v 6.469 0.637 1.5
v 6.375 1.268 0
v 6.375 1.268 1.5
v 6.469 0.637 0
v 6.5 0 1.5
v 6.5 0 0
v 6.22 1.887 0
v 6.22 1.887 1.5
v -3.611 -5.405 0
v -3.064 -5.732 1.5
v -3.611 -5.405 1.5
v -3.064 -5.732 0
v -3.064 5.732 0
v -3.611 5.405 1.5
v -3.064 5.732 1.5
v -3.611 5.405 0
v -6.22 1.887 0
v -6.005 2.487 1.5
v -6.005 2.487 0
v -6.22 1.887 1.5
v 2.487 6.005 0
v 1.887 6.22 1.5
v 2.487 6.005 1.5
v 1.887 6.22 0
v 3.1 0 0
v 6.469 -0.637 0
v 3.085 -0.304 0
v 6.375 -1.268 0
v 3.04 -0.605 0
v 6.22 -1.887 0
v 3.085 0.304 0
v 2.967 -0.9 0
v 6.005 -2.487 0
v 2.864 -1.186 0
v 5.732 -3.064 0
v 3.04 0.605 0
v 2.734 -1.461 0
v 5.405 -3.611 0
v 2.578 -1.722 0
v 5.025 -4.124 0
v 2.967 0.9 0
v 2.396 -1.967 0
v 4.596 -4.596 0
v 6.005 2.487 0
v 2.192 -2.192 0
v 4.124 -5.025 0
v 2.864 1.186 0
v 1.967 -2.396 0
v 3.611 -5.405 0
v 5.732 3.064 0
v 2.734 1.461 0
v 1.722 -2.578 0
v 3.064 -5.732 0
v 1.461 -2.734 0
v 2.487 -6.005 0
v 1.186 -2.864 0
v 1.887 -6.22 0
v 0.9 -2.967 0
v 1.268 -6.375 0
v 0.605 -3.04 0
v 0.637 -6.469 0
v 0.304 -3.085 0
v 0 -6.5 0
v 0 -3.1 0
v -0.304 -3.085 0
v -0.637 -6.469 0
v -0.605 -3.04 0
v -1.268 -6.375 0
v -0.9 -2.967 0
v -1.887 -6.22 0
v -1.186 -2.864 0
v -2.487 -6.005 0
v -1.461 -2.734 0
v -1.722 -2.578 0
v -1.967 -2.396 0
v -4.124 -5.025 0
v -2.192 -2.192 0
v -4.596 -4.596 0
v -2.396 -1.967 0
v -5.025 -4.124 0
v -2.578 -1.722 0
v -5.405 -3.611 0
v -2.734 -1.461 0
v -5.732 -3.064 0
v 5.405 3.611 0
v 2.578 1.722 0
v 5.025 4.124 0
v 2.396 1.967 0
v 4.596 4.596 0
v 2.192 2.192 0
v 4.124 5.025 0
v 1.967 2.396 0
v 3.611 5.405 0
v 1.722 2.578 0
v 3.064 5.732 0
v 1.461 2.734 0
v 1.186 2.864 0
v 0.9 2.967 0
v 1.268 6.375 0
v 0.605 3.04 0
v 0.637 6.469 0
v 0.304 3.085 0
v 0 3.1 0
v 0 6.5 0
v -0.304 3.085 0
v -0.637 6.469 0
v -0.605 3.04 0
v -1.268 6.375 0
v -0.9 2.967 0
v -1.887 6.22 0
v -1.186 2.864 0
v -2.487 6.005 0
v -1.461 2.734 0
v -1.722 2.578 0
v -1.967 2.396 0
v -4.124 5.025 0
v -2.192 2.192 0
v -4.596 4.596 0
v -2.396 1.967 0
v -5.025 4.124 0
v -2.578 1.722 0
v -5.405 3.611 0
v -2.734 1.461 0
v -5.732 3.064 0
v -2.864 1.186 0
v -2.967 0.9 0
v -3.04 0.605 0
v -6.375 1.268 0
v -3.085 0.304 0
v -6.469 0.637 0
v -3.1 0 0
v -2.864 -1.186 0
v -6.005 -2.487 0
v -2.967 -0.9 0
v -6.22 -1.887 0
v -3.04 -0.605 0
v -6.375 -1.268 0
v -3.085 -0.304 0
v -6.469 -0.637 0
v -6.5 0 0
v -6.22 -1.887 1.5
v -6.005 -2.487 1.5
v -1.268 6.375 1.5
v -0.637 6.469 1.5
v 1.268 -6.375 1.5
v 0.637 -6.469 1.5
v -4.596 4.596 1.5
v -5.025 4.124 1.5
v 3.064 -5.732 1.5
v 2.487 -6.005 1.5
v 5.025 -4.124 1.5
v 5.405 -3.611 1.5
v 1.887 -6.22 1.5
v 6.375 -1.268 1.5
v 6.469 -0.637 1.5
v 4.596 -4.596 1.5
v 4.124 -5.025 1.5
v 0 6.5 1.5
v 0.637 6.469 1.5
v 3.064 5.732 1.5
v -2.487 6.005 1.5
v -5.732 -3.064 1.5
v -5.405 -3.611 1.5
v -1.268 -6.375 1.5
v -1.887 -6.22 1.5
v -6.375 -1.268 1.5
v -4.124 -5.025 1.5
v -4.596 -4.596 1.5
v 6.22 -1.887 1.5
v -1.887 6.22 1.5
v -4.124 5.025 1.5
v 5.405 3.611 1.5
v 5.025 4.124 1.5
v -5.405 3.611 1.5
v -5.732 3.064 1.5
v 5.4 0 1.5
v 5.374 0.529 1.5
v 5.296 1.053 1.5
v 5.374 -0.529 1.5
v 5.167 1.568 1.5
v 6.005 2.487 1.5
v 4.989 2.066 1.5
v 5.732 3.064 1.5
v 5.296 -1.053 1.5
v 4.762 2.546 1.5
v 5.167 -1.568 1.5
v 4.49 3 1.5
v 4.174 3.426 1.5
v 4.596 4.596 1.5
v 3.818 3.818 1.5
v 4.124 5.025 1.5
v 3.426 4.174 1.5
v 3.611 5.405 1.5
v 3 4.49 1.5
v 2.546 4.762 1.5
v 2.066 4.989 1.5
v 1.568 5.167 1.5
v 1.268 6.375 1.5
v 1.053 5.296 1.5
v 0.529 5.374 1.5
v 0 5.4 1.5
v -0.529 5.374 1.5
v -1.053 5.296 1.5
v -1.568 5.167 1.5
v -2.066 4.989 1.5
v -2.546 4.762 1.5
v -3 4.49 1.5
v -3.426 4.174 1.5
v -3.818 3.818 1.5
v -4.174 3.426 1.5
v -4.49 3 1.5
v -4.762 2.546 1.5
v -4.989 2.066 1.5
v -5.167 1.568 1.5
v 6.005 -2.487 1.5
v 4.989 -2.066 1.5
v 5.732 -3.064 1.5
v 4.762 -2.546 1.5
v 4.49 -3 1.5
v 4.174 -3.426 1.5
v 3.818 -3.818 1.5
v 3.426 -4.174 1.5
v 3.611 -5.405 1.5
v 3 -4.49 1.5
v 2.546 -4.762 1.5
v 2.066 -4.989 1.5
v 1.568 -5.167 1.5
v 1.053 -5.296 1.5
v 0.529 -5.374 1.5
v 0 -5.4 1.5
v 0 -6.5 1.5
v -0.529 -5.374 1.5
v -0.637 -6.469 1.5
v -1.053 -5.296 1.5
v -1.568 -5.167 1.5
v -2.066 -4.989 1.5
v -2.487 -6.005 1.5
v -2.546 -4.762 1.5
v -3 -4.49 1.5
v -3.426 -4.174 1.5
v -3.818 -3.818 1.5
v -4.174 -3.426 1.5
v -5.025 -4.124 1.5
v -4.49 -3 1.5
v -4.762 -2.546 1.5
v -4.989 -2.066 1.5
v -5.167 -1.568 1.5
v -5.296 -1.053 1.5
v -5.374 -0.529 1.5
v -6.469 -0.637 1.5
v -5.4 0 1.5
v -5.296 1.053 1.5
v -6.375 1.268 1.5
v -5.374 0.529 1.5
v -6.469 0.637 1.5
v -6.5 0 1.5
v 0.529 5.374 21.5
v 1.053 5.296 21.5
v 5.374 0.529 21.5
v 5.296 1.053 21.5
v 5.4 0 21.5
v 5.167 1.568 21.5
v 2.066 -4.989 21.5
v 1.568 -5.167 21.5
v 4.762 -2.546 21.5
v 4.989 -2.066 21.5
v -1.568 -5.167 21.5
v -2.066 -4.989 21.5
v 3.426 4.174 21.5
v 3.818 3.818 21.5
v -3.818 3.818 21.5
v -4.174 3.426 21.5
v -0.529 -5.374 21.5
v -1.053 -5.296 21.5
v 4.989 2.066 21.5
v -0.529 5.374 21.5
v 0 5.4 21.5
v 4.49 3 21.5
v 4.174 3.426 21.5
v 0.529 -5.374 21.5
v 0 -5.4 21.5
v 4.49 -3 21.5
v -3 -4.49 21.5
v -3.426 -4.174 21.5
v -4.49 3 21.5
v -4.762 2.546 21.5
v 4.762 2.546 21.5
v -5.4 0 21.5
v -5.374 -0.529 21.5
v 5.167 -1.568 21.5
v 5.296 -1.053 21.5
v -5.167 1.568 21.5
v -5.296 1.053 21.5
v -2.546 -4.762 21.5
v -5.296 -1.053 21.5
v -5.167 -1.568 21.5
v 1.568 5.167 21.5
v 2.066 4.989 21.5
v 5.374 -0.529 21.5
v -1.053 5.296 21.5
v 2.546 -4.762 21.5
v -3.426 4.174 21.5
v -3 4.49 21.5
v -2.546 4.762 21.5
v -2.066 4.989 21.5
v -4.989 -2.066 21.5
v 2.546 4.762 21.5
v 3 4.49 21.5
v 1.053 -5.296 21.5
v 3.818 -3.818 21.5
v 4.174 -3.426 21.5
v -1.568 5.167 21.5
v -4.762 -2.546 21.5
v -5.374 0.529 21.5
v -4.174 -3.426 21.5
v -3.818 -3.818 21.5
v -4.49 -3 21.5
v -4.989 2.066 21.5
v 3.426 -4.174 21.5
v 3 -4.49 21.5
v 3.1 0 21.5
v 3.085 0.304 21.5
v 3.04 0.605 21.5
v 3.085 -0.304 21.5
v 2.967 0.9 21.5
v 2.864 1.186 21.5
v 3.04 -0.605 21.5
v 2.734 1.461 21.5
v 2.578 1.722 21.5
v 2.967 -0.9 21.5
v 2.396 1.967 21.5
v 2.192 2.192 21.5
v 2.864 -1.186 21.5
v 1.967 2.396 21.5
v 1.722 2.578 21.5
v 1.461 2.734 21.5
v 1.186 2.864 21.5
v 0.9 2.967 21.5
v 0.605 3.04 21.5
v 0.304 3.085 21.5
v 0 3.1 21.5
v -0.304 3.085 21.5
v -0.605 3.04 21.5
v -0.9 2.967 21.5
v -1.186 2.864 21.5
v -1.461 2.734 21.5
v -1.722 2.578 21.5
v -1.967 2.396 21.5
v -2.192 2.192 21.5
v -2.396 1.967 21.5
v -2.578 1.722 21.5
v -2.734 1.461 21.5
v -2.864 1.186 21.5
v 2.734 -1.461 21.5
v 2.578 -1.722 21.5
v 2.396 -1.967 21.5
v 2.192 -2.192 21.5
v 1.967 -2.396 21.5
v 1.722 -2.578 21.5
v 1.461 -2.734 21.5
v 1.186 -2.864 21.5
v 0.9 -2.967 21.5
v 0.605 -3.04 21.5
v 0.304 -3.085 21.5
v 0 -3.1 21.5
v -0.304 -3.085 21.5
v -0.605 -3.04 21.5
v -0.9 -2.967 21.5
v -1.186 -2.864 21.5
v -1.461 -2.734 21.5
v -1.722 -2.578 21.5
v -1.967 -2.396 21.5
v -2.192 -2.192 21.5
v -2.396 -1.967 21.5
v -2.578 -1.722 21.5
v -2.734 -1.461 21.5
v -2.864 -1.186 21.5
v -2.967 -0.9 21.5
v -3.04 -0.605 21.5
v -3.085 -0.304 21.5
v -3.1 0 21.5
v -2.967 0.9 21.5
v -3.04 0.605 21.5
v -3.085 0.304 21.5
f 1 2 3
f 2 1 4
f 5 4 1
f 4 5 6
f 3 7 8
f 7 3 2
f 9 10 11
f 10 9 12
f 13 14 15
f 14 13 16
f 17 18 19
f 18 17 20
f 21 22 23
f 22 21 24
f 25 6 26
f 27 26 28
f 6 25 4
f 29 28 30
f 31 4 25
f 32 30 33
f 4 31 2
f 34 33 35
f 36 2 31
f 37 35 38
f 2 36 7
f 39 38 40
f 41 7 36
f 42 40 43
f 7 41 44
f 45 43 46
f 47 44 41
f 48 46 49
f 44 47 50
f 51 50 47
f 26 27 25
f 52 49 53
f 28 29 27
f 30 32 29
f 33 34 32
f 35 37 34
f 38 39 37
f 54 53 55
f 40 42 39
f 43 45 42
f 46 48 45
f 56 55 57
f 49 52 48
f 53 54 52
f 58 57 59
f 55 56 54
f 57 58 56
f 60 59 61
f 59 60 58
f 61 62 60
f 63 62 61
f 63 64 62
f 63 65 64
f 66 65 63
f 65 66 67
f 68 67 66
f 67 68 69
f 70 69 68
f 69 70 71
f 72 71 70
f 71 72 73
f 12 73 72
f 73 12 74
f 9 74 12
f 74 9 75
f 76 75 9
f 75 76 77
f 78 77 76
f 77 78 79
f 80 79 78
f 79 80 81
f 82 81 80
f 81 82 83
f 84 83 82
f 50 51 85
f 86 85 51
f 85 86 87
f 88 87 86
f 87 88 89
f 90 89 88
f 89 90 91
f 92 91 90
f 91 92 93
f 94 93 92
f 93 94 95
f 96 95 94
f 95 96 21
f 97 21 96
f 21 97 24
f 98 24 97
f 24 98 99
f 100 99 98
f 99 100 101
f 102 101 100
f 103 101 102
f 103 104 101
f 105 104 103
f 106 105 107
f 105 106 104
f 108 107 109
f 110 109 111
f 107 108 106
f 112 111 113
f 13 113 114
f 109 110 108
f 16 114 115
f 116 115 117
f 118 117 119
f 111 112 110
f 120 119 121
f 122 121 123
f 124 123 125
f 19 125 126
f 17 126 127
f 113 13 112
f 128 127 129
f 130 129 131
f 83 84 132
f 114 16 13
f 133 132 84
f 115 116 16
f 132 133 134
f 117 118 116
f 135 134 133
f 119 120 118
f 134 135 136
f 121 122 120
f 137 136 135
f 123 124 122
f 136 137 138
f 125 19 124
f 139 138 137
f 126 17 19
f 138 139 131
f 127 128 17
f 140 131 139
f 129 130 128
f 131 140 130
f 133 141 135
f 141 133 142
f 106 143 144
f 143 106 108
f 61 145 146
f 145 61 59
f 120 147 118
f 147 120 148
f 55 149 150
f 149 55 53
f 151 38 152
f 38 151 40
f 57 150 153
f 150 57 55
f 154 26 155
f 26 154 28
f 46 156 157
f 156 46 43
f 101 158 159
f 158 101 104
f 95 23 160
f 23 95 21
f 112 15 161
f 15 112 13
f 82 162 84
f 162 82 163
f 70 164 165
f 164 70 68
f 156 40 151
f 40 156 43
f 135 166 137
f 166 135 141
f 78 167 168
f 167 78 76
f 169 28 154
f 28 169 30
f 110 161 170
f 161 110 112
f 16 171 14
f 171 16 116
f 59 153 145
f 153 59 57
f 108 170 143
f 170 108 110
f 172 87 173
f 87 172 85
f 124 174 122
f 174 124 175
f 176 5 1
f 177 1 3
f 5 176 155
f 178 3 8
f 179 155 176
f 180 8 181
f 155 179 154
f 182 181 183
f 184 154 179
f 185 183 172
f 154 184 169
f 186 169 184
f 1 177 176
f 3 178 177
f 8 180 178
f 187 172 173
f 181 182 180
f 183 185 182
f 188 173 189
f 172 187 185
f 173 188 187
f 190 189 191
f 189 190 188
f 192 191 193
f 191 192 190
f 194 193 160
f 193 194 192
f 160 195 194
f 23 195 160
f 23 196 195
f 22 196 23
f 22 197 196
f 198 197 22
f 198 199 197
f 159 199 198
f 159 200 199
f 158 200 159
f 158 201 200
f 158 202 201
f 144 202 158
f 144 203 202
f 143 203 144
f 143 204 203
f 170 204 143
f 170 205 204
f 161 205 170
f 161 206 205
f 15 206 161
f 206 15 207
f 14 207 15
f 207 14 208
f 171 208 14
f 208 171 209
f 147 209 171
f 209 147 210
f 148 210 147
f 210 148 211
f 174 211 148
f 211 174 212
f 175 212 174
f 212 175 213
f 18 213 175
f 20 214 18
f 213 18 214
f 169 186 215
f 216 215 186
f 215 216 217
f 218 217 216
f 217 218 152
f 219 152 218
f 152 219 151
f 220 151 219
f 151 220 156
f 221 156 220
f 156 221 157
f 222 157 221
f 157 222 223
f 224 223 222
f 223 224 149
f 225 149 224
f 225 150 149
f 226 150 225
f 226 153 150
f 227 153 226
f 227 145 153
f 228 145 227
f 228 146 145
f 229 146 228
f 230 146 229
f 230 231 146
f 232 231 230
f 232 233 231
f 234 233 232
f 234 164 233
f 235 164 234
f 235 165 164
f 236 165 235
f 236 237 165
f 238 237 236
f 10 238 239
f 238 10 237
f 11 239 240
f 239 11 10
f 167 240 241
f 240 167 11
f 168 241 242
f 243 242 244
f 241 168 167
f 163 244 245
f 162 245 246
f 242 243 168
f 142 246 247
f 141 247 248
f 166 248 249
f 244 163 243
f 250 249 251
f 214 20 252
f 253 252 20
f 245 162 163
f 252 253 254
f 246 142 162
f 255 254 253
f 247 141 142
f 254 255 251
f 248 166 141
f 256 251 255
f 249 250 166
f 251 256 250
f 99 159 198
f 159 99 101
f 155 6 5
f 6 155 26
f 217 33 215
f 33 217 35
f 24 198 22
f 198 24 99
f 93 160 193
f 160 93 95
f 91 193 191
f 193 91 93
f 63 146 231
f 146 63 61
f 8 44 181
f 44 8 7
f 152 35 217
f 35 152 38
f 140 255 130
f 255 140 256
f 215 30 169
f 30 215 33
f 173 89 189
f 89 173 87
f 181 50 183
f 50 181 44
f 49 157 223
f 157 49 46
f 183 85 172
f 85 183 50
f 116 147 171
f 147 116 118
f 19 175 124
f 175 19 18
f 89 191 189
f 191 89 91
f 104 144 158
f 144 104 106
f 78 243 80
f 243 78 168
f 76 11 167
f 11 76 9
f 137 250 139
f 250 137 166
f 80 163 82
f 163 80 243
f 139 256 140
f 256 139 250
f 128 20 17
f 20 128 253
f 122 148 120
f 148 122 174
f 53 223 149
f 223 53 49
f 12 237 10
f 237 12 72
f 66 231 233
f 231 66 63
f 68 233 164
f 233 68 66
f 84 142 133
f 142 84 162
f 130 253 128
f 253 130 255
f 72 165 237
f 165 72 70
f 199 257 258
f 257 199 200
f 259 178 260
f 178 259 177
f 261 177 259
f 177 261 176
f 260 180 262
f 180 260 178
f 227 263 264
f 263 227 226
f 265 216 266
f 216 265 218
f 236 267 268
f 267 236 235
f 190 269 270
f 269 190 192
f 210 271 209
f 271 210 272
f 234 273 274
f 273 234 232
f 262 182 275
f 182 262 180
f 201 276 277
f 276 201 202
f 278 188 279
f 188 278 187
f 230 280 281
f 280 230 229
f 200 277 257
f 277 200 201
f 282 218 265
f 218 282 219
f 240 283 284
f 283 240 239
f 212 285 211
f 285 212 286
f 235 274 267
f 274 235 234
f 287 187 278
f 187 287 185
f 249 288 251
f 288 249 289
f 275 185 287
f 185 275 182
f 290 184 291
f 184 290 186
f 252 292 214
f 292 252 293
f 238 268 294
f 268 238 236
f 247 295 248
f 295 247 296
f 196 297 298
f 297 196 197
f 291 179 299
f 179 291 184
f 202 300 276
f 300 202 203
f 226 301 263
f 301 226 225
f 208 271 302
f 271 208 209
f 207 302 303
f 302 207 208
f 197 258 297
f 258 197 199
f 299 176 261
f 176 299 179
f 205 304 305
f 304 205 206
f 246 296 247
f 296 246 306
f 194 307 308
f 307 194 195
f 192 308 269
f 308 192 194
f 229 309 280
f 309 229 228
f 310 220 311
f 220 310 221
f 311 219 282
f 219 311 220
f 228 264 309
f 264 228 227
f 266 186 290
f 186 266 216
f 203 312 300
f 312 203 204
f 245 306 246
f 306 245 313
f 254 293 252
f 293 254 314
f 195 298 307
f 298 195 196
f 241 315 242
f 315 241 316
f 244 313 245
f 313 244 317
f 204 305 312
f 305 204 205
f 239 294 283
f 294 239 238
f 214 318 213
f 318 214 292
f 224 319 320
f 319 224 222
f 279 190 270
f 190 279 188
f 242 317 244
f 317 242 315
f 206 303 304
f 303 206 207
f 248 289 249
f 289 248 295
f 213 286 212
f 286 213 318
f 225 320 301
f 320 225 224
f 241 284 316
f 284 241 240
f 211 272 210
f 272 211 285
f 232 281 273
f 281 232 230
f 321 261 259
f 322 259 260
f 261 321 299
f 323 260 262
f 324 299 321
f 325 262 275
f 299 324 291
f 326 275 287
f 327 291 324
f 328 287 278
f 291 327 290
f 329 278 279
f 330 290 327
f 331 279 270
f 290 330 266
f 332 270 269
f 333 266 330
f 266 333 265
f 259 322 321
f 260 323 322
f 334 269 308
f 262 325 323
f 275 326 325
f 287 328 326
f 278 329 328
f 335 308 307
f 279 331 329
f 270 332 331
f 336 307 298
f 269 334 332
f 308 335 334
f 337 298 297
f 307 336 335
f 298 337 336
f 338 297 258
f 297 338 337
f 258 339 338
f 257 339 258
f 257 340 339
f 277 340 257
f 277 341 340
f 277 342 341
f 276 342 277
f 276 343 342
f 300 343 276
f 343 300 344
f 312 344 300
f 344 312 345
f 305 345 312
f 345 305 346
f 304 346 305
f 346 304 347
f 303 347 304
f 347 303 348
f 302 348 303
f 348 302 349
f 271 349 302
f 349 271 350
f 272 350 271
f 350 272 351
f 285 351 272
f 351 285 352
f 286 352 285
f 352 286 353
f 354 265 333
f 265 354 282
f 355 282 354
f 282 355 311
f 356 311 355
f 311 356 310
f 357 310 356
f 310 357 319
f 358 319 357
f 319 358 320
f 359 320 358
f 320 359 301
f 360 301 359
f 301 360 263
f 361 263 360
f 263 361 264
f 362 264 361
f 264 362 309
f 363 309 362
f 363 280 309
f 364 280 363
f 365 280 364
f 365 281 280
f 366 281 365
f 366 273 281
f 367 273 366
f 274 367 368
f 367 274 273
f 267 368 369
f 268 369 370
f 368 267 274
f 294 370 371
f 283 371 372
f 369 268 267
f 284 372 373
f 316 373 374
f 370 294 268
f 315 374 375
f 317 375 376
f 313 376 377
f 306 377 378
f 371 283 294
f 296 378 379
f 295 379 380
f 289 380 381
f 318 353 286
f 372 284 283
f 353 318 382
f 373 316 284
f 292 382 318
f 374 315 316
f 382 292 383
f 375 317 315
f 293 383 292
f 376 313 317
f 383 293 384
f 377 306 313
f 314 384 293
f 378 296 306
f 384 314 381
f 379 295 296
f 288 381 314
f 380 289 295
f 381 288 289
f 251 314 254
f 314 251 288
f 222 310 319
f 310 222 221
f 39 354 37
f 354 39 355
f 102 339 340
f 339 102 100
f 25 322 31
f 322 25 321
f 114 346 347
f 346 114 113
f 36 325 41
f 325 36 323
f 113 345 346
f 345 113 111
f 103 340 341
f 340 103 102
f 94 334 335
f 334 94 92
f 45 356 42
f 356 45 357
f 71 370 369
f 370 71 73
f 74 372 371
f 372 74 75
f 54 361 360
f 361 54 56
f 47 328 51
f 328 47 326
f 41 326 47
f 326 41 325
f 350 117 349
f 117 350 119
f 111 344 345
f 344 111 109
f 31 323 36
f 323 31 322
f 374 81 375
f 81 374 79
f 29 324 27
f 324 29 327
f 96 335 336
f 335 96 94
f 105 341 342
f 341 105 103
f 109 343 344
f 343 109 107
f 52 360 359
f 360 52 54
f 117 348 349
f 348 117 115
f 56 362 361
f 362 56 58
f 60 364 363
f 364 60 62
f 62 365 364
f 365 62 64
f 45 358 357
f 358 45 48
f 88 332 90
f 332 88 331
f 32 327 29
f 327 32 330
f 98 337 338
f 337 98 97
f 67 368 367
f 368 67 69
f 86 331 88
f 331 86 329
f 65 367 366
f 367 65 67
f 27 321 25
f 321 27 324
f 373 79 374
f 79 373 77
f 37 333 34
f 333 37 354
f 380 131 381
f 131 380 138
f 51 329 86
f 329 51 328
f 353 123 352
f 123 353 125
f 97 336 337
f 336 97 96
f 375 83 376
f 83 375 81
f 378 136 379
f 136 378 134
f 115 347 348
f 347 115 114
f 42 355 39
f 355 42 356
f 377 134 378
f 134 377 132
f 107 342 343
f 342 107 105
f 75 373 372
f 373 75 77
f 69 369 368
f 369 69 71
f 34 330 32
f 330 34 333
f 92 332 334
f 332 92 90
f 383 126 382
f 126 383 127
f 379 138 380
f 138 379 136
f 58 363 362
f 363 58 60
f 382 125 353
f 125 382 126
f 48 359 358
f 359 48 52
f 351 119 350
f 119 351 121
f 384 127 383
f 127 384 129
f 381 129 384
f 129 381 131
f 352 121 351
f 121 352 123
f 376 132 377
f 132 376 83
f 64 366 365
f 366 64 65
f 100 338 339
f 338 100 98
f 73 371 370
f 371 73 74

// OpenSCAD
// Adapter sleeve: 0.2 mL PCR tube into a 1.5 mL rack hole
// Print orientation: collar (13 mm dia, 1.5 mm thick) on the bed (z = 0..1.5),
// sleeve body (10.8 mm OD) rising to z = 21.5, straight 6.2 mm bore through full height.

// ---- Dimensions (mm) ----
collar_dia   = 13.0;   // outer diameter of the bed-lying collar
collar_thk   = 1.5;    // thickness of the collar (z = 0 to 1.5)
sleeve_od    = 10.8;   // outer diameter of the sleeve body
sleeve_top   = 21.5;   // total height of the part (top of sleeve body)
bore_dia     = 6.2;    // straight through-bore diameter

// ---- Derived radii ----
collar_r     = collar_dia / 2;   // 6.5
sleeve_r     = sleeve_od  / 2;   // 5.4
bore_r       = bore_dia   / 2;   // 3.1

// ---- Curvature resolution ----
$fn = 64;

// ---- Part (centred on origin in X/Y, resting on z = 0) ----
// Union of the collar and the sleeve body, then subtract the through-bore.
// The bore cylinder is extended 1 mm past each face so no cut face is coplanar.
difference() {
    union() {
        // Collar: 13 mm dia, 1.5 mm thick, lying on the bed
        cylinder(h = collar_thk, d = collar_dia, $fn = $fn);

        // Sleeve body: 10.8 mm OD, rising from the collar to z = 21.5
        translate([0, 0, collar_thk])
            cylinder(h = sleeve_top - collar_thk, d = sleeve_od, $fn = $fn);
    }

    // Straight 6.2 mm bore, open at both ends (extended 1 mm past each face)
    translate([0, 0, -1.0])
        cylinder(h = sleeve_top + 2.0, d = bore_dia, $fn = $fn);
}
